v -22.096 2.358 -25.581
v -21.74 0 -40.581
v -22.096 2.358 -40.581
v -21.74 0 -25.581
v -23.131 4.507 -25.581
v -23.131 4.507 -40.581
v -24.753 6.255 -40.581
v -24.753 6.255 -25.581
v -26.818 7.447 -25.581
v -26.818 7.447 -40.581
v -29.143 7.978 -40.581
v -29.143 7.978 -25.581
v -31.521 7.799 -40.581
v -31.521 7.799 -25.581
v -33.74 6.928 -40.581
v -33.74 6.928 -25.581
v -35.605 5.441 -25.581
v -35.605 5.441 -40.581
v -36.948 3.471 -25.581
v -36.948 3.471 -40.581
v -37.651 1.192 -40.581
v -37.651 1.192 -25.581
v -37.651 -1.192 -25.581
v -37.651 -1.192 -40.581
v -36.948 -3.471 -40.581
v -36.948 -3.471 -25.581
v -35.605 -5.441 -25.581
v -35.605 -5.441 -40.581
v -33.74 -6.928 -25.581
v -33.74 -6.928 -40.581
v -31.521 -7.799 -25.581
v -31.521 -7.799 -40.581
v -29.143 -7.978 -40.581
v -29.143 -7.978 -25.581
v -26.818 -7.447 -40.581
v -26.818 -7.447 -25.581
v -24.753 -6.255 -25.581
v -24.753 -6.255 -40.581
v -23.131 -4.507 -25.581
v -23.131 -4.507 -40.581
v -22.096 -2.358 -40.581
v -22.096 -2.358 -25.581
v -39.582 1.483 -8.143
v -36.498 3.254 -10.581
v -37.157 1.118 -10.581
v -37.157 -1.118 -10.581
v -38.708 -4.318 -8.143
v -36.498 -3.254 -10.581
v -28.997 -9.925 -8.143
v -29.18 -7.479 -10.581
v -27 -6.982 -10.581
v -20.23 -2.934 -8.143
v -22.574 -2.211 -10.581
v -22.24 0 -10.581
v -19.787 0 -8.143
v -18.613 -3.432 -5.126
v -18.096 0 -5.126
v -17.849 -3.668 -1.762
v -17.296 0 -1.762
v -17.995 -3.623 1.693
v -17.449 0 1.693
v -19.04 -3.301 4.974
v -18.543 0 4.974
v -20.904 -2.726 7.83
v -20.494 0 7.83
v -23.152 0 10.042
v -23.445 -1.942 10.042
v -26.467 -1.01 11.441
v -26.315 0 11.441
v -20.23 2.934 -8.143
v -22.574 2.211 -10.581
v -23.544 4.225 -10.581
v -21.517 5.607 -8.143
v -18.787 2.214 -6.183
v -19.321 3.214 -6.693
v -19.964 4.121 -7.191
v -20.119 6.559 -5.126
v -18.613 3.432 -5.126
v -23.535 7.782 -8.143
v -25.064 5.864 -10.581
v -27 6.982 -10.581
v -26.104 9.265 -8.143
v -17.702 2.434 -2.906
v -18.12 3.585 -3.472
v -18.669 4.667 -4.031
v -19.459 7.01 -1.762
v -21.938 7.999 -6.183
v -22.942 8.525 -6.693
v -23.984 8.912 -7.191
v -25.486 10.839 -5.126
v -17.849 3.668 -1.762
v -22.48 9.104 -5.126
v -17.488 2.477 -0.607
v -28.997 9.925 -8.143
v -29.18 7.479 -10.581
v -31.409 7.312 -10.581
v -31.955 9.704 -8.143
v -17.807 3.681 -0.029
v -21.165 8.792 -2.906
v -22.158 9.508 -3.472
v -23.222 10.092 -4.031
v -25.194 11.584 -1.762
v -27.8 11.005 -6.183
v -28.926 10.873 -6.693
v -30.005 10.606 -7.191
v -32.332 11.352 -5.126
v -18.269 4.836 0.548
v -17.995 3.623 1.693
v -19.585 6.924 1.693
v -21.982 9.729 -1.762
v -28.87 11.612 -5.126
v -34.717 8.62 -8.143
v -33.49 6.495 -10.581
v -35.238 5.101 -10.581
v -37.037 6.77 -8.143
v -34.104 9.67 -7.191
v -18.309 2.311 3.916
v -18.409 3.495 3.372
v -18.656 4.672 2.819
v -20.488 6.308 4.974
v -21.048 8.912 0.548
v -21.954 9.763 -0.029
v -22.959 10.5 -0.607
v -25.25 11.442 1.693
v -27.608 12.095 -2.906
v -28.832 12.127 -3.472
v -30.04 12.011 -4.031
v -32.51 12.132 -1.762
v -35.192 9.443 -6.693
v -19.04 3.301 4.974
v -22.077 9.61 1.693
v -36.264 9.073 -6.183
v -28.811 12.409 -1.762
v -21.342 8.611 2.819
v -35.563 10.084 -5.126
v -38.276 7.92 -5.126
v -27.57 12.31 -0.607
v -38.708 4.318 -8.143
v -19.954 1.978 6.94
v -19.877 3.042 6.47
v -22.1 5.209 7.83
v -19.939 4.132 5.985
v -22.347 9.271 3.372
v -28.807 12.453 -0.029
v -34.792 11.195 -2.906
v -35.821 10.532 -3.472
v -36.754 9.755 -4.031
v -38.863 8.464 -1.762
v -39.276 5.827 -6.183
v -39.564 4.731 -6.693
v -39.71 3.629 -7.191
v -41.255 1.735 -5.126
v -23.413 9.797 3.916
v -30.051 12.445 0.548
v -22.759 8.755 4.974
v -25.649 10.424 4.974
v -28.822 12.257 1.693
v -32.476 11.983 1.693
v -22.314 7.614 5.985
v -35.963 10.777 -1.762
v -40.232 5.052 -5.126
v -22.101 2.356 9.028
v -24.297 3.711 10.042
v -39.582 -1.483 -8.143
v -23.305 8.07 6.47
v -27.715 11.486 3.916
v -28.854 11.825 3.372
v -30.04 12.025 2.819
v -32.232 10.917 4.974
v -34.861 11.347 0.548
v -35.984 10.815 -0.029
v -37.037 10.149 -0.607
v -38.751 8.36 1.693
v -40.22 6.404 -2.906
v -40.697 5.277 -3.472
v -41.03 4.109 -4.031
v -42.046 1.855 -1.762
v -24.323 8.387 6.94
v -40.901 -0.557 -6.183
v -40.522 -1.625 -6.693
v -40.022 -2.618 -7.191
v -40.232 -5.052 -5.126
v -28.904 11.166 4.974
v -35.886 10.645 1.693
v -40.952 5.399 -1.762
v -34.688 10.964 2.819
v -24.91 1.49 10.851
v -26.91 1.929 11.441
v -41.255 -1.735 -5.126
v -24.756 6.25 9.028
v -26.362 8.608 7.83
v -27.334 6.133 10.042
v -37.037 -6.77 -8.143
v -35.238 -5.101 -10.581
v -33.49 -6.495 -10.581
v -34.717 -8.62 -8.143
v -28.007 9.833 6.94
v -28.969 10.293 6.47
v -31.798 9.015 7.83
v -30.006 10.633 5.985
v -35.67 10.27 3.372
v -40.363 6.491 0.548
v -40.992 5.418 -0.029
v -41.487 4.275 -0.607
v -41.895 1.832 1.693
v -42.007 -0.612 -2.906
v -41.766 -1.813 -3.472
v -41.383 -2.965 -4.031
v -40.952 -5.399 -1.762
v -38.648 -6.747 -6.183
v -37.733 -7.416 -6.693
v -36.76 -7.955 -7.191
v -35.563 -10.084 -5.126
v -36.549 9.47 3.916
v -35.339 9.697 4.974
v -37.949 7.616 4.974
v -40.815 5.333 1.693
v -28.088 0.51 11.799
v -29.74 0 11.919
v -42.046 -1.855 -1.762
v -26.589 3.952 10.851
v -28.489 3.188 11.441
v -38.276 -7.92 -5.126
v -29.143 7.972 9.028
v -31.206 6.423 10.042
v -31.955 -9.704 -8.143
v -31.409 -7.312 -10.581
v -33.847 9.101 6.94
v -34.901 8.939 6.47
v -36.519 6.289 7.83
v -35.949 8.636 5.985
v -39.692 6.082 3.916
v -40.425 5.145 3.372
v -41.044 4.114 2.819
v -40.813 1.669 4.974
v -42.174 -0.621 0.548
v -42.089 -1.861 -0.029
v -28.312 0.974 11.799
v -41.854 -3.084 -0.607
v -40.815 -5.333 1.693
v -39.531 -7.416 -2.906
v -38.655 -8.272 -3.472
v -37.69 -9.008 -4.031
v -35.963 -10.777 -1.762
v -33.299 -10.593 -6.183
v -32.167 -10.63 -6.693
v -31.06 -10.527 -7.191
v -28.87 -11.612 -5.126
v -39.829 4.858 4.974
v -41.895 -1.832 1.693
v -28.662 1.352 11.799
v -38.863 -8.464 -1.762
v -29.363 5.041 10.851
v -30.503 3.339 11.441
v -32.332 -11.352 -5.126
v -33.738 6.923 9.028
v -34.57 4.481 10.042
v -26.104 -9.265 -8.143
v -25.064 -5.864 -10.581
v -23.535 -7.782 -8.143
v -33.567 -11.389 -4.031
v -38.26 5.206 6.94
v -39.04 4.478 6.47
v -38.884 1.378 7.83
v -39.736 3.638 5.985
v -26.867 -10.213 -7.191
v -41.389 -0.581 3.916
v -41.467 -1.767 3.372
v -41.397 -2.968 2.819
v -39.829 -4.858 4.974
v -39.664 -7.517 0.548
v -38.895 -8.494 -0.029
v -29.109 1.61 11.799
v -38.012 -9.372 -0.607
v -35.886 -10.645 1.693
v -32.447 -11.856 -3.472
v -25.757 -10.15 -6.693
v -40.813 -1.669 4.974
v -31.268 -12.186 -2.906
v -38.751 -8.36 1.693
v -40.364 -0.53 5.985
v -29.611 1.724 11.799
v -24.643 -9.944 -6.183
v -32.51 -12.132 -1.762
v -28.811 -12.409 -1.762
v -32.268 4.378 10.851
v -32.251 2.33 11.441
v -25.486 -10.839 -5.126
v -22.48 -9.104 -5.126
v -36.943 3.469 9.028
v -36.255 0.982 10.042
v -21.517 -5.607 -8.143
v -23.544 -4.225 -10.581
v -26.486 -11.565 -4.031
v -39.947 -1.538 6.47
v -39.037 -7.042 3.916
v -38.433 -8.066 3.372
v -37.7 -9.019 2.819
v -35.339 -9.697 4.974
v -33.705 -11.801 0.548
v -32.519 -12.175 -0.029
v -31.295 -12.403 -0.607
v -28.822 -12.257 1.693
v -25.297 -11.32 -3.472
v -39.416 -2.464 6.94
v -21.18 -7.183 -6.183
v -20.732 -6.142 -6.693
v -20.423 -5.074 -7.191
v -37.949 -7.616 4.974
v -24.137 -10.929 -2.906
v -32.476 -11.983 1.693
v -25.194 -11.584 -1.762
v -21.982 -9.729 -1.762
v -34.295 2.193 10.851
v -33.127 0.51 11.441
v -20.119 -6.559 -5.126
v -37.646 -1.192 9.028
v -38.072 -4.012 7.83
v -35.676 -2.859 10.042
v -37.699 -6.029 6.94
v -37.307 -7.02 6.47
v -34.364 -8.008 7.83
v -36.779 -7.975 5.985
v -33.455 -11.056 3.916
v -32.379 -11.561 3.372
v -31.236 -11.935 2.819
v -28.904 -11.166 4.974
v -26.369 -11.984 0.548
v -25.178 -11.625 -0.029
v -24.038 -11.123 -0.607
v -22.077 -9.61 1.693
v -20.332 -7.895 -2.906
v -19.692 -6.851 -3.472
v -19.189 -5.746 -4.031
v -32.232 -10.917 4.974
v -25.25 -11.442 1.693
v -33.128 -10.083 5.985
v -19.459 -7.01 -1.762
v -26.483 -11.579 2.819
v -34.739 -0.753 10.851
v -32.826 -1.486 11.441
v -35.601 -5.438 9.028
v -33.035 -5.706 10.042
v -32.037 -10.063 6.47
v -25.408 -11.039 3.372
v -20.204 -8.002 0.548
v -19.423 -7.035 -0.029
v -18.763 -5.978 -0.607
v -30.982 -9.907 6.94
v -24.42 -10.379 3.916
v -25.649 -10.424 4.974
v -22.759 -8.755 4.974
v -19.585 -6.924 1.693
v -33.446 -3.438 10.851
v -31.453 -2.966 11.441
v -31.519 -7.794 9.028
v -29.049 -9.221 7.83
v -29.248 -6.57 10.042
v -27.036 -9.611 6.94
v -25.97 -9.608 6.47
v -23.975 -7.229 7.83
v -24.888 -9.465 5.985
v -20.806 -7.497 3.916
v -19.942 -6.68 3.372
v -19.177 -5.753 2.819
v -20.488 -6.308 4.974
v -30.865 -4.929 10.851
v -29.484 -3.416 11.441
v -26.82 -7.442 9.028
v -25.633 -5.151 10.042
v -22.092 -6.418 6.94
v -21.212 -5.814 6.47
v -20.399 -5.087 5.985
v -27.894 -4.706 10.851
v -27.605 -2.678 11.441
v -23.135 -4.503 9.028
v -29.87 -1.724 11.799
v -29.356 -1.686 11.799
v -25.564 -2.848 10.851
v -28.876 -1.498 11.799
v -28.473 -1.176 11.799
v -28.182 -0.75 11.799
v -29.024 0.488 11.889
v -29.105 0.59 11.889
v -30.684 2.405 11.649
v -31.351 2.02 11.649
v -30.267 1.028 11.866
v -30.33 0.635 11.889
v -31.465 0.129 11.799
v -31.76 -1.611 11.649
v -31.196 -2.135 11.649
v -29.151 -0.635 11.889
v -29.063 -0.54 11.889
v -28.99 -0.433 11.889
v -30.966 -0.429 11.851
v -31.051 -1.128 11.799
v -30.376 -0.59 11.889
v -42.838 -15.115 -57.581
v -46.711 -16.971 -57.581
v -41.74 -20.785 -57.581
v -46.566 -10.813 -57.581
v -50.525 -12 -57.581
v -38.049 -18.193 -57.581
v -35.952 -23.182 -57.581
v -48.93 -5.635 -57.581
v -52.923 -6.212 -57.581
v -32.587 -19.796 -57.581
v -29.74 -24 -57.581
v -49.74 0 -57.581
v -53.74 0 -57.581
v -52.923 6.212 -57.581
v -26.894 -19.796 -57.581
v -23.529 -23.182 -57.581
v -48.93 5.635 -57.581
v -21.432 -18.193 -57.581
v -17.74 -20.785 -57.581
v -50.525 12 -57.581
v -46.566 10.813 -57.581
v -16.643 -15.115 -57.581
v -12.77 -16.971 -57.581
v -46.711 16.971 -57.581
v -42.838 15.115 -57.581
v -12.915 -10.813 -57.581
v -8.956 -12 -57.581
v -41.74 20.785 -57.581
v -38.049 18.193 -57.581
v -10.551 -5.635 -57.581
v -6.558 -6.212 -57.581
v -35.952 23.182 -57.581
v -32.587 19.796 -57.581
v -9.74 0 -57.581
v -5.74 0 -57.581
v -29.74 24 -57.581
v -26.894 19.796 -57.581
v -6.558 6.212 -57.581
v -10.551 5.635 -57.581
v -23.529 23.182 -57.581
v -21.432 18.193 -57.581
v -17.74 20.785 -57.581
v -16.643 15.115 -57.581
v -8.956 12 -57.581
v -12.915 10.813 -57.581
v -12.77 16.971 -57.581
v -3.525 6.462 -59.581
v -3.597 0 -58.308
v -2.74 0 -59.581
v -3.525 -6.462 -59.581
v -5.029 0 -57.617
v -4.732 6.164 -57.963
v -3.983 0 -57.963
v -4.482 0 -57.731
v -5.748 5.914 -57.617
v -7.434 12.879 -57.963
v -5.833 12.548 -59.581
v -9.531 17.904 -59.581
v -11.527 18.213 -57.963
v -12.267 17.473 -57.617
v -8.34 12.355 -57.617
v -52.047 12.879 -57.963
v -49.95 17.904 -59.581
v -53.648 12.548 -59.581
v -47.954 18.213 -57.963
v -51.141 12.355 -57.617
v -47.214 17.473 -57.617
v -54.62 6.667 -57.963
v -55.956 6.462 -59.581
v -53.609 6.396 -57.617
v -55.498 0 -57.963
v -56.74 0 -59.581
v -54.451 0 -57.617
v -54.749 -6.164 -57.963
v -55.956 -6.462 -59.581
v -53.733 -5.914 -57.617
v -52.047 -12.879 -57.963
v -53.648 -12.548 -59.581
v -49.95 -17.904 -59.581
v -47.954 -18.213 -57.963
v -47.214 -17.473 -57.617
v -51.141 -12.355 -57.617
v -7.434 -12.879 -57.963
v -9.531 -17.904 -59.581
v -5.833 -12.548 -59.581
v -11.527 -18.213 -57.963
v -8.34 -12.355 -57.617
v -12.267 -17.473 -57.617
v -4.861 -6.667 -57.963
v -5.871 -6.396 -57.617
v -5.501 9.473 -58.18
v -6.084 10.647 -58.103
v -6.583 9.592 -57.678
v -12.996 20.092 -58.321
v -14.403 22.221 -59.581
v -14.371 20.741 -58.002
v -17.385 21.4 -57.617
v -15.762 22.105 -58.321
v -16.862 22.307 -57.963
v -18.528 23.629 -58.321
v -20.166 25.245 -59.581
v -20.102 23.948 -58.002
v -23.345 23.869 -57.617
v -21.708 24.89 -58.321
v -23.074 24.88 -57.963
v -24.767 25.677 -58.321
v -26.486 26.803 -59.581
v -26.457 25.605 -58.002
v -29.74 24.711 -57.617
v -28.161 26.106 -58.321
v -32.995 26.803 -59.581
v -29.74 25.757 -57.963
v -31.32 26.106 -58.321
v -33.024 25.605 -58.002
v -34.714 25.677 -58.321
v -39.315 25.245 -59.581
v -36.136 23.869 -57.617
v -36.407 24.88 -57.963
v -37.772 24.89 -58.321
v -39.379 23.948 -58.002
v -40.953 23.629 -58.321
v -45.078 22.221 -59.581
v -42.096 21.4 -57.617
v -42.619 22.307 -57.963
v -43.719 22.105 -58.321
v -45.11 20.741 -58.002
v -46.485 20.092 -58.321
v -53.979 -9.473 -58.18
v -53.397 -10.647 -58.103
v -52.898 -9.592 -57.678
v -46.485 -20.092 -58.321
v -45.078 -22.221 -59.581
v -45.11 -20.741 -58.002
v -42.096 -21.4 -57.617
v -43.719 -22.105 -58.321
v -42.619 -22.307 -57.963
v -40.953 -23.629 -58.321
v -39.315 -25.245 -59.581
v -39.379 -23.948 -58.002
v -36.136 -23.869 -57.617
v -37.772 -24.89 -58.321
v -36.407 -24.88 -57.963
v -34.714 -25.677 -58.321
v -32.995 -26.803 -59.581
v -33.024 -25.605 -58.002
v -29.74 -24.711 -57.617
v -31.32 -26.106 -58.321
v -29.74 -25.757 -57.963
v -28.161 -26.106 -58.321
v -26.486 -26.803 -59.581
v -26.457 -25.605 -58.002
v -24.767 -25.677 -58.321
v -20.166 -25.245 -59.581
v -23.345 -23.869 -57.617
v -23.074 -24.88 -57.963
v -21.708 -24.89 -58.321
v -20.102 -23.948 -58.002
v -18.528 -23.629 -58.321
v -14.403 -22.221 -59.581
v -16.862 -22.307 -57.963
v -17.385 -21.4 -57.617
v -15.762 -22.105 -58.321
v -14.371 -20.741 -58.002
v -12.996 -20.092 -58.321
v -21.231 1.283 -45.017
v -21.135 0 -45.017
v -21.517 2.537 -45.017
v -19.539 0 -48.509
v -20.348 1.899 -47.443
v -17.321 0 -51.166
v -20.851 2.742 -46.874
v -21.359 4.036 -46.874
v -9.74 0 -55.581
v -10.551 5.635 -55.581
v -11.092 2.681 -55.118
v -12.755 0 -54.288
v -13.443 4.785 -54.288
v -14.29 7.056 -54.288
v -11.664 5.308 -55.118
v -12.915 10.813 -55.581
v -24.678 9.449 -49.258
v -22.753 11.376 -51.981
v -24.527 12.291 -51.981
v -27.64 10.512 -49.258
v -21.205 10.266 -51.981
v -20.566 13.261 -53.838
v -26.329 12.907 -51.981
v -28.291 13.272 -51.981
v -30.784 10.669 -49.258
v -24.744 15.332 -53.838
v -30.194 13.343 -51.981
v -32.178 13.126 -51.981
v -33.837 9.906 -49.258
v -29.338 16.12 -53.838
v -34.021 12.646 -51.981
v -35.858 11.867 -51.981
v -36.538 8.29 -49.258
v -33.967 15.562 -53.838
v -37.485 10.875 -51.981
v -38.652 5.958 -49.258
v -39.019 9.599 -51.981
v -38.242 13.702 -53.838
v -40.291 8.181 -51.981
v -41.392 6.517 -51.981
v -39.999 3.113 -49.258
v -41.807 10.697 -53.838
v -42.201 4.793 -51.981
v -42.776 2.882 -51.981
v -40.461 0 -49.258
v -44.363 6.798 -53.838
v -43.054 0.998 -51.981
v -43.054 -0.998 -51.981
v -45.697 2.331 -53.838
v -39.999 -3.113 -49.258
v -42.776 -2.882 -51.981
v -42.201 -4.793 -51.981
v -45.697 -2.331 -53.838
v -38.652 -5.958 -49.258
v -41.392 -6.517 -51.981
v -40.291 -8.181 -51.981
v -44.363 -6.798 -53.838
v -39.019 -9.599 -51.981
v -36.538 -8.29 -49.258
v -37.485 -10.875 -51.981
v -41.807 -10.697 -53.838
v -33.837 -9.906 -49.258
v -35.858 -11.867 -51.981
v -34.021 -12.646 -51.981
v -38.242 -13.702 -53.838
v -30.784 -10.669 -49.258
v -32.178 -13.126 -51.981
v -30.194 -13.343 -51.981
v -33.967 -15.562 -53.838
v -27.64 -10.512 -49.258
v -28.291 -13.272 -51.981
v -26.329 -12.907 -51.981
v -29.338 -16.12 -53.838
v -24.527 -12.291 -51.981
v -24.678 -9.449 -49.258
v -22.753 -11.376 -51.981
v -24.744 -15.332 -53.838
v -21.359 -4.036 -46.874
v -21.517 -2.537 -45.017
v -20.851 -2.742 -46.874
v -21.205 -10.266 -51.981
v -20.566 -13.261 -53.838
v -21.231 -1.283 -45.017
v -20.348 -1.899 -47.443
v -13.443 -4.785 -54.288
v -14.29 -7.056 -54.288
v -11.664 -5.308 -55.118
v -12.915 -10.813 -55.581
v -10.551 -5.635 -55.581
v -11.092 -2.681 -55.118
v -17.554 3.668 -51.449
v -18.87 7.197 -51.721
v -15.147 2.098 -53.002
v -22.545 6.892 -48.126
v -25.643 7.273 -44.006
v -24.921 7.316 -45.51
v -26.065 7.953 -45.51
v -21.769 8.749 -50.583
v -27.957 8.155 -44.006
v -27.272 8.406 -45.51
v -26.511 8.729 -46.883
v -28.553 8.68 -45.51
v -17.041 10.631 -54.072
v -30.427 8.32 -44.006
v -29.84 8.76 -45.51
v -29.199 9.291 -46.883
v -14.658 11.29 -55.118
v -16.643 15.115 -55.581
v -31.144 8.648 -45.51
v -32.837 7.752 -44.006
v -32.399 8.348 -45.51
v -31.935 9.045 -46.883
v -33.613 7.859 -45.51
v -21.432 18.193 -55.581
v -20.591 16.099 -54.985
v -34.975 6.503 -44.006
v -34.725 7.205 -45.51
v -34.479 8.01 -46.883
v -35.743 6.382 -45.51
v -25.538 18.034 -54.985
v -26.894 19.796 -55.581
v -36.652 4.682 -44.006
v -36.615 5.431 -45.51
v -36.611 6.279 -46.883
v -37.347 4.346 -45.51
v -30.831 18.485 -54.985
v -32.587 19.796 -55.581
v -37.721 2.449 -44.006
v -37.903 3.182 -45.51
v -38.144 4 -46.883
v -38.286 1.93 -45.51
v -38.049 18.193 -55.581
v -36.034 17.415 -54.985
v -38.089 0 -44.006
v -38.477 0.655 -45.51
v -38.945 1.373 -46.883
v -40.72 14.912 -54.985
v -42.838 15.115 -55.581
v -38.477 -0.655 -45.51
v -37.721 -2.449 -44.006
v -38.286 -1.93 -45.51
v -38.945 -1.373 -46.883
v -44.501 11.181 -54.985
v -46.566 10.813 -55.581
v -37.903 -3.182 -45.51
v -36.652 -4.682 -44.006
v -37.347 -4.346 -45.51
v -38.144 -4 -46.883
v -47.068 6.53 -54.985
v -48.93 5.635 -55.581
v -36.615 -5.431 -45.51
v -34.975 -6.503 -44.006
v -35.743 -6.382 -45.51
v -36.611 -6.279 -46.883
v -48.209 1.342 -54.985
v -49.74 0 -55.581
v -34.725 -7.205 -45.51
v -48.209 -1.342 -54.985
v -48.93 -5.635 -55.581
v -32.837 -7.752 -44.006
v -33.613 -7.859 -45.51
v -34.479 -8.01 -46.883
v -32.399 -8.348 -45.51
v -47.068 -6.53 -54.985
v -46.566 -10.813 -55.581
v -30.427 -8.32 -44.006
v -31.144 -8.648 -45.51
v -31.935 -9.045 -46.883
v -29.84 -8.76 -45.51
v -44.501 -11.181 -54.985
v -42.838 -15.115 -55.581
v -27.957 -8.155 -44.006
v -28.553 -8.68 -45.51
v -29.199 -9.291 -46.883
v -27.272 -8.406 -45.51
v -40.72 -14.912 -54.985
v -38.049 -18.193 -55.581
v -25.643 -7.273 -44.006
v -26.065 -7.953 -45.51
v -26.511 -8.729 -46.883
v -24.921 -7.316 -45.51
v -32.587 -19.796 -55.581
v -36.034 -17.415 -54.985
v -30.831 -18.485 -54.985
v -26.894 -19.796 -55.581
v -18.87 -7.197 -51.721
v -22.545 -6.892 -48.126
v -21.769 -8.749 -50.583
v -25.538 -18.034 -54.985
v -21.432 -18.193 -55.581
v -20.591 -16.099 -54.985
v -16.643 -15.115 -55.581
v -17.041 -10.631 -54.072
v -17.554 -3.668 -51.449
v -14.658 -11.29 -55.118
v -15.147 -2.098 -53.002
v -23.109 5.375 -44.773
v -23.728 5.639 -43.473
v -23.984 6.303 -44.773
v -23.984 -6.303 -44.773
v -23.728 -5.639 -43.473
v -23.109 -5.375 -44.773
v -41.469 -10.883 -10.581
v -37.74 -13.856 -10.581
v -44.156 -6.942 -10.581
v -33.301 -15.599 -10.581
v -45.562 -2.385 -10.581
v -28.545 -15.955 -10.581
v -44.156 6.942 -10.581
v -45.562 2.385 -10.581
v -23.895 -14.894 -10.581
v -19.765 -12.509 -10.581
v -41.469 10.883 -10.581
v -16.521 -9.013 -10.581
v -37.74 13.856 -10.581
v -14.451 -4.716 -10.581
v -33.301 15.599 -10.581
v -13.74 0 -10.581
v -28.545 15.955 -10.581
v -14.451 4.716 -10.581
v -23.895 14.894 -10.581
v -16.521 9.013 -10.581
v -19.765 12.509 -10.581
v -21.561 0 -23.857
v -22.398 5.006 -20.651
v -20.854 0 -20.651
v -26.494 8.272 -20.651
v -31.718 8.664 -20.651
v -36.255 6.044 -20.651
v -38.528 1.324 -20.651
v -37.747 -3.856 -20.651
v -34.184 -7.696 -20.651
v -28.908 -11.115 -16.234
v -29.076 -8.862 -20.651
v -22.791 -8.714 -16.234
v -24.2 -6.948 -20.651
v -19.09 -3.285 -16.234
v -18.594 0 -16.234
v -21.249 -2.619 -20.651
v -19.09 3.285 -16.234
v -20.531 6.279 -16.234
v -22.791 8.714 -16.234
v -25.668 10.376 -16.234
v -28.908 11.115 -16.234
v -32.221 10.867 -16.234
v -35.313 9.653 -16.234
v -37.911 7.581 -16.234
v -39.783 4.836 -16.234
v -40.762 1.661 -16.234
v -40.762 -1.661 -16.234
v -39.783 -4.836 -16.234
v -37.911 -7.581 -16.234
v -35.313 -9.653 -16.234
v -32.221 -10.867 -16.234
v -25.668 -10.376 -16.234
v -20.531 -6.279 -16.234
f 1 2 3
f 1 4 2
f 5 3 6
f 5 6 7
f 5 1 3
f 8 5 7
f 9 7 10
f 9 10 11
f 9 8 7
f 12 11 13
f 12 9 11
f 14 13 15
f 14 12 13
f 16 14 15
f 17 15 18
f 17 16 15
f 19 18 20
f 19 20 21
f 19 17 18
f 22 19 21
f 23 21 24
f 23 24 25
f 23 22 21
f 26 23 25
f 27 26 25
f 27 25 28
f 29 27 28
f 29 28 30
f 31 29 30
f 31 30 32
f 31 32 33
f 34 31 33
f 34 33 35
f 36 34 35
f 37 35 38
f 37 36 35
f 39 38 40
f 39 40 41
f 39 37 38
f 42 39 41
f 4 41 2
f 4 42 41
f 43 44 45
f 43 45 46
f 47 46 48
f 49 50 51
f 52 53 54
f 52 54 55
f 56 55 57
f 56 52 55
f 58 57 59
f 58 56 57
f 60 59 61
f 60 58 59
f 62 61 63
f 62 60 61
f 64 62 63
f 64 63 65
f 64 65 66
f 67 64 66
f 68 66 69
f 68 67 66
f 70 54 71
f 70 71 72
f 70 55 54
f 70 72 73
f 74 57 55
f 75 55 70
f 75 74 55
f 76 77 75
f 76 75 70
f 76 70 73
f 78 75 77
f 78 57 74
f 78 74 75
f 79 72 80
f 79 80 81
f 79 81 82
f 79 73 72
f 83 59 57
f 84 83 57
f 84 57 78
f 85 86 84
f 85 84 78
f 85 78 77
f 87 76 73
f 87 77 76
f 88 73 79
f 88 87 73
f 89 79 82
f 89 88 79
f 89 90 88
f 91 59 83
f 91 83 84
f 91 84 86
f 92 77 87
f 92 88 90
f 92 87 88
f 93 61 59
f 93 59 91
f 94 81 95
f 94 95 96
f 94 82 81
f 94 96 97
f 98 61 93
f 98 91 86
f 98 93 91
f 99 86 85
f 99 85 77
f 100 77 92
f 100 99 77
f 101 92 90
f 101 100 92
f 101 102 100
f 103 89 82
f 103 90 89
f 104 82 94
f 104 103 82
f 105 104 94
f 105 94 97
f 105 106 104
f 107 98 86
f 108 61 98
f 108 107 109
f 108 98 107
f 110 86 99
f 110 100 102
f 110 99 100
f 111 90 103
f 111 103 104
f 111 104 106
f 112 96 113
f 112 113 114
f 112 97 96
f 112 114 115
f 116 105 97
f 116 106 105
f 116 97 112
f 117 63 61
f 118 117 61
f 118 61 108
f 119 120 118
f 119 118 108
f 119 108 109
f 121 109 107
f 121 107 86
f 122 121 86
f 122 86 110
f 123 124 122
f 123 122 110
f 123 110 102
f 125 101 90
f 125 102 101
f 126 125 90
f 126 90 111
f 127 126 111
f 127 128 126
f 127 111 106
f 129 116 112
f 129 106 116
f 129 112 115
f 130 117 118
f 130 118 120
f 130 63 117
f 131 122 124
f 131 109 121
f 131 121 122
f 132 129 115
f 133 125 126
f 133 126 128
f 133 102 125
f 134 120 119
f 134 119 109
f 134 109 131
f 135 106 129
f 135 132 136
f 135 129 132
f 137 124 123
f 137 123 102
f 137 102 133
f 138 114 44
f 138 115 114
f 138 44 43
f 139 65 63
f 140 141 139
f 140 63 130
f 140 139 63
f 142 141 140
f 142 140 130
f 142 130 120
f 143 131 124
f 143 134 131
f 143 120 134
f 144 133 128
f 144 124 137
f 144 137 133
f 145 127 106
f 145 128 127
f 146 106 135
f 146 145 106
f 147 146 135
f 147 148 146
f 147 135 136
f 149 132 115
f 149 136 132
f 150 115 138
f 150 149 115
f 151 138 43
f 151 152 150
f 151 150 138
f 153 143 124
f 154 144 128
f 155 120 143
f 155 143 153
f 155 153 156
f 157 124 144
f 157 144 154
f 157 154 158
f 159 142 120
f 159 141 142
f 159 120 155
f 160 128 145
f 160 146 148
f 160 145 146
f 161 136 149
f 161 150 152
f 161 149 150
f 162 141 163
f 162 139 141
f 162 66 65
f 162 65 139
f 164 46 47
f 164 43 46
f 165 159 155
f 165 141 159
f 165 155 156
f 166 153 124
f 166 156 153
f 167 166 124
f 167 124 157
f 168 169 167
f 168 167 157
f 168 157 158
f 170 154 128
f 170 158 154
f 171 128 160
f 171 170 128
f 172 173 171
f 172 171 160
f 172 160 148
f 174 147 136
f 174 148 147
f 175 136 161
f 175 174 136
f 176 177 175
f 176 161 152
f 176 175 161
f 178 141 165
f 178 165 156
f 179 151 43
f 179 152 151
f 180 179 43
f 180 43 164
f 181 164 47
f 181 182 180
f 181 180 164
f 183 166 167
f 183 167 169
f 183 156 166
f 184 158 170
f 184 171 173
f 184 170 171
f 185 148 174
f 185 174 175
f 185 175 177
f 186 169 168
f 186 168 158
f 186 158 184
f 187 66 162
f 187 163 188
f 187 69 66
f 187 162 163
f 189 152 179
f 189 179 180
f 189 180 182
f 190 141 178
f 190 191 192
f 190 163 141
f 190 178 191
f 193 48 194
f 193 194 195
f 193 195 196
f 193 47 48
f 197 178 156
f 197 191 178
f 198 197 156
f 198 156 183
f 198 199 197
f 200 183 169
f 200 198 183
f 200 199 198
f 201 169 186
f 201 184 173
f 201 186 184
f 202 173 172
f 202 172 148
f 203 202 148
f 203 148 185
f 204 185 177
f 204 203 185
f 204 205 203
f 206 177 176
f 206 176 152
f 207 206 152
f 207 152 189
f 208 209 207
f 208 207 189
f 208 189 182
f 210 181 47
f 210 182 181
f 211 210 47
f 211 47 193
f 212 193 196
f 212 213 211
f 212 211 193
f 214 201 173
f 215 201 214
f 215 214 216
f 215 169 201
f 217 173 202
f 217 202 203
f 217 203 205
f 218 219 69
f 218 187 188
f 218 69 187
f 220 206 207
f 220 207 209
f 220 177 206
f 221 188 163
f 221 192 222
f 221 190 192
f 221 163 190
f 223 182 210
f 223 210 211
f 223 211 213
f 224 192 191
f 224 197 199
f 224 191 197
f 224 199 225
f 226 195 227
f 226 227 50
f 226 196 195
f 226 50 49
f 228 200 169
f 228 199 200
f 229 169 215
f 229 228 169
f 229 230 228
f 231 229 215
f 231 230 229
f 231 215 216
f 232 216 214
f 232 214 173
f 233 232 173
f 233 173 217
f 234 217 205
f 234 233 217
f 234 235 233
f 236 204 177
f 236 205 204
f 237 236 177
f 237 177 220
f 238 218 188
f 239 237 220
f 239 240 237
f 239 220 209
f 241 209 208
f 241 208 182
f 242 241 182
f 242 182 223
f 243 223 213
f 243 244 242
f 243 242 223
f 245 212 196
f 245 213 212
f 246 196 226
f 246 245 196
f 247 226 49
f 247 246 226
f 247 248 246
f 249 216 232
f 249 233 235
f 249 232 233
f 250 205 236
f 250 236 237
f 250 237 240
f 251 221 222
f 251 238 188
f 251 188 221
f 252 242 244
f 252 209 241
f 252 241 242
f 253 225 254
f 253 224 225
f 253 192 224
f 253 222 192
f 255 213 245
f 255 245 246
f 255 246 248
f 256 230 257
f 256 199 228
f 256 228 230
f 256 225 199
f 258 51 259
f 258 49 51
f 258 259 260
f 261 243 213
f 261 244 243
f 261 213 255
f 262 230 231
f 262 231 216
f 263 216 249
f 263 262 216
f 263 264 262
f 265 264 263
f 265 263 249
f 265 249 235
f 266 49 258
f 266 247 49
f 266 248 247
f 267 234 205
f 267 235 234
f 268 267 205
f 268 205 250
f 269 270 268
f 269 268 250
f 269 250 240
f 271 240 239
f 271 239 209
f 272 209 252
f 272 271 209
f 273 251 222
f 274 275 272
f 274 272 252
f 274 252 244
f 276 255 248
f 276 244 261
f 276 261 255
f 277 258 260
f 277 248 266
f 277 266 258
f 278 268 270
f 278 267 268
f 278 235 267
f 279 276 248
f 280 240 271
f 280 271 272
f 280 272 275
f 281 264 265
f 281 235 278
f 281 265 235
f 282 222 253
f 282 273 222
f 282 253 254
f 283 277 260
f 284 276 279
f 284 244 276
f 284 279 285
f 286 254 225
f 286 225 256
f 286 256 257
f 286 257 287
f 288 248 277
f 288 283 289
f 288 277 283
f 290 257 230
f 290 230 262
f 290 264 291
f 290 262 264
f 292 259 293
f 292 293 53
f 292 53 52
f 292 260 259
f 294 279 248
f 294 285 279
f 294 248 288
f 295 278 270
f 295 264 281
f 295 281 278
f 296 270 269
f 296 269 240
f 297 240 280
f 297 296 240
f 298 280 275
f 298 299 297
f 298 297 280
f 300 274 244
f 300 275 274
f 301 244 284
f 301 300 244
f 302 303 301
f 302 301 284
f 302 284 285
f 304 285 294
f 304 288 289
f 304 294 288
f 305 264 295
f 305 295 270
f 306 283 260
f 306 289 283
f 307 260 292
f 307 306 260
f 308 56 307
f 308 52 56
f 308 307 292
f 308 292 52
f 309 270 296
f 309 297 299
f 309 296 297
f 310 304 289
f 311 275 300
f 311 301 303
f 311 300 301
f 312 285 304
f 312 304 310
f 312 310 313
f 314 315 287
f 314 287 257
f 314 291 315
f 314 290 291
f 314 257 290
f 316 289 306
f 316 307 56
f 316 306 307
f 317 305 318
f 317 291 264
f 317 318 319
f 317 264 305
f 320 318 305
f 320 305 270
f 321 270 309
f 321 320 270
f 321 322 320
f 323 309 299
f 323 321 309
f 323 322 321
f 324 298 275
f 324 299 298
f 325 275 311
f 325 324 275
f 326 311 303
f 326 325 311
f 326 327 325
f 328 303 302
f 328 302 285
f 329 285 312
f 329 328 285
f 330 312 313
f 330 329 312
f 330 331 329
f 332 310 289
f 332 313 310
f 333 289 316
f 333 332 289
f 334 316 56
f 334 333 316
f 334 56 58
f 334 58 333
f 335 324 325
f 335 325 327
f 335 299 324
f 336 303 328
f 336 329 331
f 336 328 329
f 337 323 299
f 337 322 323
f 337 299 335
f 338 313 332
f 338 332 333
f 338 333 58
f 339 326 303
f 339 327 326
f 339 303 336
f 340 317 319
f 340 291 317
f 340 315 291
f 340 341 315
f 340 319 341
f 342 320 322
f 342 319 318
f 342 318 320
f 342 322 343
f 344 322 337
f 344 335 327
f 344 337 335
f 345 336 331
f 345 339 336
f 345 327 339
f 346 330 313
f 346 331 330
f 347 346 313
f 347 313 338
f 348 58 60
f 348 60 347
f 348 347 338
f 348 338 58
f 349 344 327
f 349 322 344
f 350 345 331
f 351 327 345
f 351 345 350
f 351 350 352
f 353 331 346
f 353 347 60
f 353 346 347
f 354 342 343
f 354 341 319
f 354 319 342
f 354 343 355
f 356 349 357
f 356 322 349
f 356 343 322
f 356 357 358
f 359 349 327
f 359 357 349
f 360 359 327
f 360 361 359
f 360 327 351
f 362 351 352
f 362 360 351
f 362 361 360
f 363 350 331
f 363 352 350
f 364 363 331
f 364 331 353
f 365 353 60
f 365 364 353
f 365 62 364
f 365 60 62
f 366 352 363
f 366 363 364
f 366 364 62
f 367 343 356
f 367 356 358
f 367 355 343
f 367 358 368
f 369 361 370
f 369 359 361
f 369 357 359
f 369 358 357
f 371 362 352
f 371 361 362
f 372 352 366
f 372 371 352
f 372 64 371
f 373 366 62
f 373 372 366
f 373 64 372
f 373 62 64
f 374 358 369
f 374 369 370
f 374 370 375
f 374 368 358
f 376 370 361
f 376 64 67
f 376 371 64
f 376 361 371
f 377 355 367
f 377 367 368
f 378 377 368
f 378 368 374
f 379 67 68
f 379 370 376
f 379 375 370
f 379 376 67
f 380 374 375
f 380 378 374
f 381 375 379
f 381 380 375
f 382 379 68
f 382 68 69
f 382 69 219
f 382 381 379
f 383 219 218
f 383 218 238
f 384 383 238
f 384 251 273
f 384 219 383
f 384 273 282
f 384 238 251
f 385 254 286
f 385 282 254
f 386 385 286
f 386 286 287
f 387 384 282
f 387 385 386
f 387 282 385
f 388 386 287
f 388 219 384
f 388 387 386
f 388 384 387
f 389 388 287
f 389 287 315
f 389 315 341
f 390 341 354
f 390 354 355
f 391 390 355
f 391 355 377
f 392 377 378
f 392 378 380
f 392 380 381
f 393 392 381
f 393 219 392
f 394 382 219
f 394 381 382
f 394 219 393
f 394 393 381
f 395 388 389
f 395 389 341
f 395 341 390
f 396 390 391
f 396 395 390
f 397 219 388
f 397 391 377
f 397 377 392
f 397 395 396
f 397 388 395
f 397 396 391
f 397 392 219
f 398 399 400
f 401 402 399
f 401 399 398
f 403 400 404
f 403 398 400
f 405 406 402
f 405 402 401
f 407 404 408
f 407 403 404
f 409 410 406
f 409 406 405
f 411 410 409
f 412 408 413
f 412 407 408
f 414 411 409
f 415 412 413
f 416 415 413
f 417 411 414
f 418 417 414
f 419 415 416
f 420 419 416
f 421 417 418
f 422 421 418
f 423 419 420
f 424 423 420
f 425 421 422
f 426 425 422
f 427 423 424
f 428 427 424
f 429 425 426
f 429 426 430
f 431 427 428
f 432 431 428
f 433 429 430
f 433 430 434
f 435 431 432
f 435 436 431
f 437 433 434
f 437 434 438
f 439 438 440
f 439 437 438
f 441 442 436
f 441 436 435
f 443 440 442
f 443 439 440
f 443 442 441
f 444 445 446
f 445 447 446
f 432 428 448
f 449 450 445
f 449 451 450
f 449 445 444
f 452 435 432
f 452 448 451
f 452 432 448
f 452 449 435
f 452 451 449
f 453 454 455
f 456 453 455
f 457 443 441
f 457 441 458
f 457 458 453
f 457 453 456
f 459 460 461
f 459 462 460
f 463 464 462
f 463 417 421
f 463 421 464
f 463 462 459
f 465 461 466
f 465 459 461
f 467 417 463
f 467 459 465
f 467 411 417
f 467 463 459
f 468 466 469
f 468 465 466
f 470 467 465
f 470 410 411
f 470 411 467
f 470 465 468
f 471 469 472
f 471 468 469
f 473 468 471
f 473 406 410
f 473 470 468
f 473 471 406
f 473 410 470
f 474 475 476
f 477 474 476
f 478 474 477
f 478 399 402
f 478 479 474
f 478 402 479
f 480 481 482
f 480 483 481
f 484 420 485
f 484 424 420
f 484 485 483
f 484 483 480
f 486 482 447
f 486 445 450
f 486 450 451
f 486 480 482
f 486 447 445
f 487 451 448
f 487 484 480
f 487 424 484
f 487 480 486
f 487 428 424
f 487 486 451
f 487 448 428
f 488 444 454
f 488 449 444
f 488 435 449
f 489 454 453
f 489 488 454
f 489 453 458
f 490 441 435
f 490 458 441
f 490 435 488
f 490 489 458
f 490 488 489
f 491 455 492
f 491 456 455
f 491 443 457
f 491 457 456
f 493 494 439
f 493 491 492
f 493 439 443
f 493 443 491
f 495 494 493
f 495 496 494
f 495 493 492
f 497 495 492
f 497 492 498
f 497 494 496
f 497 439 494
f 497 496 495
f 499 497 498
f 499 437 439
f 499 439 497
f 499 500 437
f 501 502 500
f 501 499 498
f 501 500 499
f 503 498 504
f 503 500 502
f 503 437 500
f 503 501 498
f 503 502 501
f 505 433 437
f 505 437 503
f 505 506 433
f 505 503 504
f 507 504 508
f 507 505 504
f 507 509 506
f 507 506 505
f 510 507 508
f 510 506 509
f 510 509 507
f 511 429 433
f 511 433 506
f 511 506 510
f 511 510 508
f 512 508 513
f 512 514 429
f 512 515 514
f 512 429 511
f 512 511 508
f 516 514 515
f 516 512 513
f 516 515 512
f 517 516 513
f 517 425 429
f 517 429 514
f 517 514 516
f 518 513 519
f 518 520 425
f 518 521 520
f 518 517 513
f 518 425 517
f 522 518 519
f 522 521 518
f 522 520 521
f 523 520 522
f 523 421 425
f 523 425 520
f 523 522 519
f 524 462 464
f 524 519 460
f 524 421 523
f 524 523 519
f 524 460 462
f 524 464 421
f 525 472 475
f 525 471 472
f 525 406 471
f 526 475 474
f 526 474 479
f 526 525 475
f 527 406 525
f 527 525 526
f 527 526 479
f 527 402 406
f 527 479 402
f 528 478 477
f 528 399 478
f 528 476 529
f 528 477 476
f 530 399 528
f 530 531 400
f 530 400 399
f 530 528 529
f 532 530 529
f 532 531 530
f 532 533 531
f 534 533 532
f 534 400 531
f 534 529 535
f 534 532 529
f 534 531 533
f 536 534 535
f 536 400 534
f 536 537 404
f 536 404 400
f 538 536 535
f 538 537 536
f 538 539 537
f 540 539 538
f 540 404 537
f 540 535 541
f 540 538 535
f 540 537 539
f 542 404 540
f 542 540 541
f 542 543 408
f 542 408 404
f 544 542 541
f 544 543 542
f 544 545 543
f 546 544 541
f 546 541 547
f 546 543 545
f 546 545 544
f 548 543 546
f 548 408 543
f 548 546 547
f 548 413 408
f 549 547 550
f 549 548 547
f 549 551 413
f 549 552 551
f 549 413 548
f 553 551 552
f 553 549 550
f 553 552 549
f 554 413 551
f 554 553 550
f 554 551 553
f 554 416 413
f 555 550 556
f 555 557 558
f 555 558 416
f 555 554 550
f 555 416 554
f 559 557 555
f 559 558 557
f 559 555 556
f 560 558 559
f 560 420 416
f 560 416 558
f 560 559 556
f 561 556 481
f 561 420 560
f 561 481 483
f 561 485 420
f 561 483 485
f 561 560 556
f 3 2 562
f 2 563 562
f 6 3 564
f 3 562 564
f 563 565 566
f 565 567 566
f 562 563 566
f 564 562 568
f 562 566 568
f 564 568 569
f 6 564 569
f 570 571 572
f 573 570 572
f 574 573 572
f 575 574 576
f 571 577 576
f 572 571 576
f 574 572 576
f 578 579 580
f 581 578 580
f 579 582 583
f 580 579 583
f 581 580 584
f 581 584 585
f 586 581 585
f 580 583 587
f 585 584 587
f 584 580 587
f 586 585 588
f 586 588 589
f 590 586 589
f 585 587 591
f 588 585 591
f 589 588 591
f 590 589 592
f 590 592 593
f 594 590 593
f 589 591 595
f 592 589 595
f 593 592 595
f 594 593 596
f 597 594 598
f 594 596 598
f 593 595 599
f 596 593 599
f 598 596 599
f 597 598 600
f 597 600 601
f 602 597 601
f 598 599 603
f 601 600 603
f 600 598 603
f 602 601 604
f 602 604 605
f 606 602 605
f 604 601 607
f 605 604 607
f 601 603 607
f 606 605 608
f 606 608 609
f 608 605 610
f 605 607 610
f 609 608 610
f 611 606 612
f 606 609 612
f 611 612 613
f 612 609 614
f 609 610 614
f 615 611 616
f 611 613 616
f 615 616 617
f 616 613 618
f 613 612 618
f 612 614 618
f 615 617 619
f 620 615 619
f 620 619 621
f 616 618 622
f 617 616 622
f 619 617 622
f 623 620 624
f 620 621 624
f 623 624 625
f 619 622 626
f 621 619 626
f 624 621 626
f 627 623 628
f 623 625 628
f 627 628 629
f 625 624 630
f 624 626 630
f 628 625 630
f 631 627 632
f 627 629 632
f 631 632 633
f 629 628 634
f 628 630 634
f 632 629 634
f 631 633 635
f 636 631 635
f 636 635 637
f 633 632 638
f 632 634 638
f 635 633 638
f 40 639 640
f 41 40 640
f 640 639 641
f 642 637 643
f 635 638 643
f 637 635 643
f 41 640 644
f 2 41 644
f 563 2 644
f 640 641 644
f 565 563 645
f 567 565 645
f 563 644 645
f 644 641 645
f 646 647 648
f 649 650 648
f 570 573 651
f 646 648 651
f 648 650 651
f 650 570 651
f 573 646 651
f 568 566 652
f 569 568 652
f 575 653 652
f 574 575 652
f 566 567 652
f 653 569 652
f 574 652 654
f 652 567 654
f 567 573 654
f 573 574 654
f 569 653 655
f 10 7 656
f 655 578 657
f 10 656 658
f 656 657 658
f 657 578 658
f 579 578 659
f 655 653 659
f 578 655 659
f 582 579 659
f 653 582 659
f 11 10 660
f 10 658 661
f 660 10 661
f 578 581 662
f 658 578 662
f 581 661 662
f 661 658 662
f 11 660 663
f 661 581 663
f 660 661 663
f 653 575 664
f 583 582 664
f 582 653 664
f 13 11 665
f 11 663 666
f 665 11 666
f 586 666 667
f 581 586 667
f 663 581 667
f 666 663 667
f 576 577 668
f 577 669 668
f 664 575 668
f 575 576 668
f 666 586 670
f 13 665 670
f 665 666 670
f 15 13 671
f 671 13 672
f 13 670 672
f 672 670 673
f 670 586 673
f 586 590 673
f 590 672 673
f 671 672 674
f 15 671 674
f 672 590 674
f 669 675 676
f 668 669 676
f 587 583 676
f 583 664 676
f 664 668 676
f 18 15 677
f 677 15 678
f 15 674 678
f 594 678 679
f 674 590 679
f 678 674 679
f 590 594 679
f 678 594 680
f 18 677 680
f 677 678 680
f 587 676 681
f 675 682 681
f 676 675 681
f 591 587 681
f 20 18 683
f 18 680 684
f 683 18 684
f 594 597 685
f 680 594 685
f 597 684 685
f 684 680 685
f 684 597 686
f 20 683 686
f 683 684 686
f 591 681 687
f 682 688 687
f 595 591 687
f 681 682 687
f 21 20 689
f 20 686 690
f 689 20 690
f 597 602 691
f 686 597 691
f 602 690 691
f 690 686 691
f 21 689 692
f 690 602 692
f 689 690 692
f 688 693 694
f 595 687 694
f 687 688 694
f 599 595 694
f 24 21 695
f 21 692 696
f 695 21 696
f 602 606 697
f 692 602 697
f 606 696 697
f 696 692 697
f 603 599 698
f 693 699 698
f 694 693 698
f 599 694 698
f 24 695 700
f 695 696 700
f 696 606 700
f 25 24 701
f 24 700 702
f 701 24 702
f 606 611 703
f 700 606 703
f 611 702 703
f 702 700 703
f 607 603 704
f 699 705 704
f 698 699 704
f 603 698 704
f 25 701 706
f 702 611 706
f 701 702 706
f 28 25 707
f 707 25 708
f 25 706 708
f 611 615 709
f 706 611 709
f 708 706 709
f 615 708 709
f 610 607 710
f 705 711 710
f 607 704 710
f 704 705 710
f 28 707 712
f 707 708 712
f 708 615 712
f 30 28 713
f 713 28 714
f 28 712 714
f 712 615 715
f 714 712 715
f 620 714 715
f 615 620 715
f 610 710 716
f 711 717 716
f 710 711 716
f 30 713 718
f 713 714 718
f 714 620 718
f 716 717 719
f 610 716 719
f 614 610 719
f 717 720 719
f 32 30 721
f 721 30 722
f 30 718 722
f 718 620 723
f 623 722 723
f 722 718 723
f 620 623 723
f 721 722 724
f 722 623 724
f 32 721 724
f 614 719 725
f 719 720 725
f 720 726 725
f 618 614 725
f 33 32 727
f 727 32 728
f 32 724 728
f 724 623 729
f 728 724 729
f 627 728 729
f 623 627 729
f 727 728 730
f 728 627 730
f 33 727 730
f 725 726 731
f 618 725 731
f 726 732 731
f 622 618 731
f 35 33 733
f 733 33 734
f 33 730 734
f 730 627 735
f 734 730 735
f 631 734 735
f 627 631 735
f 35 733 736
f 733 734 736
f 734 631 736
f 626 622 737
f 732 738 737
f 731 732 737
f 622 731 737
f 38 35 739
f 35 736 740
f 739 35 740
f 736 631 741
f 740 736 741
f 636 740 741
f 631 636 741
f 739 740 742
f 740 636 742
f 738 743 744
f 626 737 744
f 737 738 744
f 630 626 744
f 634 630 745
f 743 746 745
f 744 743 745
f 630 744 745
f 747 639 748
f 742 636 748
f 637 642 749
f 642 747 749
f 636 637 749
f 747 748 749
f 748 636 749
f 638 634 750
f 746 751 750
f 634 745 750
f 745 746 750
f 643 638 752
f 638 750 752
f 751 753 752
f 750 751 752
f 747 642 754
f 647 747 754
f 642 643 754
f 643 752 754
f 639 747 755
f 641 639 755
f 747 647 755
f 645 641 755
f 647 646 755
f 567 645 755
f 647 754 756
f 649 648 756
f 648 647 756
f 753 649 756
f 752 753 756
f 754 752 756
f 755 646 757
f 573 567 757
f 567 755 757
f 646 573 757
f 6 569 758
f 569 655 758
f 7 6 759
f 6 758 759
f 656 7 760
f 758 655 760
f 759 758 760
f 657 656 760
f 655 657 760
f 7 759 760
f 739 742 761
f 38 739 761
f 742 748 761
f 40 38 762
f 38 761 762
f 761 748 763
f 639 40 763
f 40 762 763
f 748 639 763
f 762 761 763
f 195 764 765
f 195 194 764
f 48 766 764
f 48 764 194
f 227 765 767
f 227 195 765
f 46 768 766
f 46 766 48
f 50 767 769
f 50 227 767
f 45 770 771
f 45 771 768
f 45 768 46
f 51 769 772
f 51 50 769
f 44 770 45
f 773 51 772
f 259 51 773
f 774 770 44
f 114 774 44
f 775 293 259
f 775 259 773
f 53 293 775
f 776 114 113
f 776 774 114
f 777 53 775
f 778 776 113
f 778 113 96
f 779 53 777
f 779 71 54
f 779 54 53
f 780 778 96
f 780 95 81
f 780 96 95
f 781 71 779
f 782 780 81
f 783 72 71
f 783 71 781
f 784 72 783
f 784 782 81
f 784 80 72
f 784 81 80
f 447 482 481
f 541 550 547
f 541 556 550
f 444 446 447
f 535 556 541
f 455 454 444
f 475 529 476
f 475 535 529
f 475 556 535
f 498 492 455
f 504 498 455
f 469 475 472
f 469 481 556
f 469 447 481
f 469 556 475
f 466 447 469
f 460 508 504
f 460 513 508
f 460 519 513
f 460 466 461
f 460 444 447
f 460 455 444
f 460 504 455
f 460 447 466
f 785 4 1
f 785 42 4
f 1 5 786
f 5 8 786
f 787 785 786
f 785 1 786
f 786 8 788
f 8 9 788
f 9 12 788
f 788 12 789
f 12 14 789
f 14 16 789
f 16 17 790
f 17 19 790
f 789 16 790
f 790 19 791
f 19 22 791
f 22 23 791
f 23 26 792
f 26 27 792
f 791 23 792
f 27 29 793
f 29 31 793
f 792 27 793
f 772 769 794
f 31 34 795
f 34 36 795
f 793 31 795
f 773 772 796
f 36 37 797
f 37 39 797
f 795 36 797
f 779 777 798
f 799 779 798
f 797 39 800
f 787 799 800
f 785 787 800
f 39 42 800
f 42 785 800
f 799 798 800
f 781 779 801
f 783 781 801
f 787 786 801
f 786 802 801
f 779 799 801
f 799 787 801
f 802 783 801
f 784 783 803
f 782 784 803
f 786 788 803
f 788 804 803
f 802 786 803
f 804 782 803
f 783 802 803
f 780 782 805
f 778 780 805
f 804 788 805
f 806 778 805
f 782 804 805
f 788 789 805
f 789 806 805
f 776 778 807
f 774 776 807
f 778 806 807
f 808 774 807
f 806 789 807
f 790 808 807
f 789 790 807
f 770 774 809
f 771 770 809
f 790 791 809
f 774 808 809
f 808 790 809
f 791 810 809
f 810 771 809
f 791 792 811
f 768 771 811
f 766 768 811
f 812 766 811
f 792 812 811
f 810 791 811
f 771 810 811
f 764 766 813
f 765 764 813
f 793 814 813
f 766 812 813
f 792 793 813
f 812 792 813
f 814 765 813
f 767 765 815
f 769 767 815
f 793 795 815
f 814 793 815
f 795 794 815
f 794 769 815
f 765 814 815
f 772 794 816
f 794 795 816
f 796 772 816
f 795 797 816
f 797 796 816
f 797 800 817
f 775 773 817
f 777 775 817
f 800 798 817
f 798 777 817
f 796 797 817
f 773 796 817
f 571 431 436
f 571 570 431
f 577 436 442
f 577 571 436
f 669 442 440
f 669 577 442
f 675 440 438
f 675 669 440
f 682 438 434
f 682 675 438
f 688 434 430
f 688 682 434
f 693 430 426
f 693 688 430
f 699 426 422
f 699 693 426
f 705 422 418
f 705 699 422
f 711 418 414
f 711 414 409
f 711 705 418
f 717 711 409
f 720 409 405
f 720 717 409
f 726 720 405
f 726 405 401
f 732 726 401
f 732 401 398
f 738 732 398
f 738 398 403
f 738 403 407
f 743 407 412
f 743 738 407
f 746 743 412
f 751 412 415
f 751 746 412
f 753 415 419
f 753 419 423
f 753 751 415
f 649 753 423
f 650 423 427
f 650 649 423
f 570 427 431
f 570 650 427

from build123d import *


with BuildPart() as f1:
    # F0 (on Front) → F1 (revolve)
    with BuildSketch(Plane.XZ):
        with BuildLine():
            Line((-13.740452, -10.580902), (-22.240452, -10.580902))
            ThreePointArc((-22.240452, -10.580902), (-17.881911, 3.371945), (-29.740452, 11.919098))
            Line((-29.740452, 11.919098), (-29.740452, -59.580902))
            Line((-29.740452, -59.580902), (-2.740452, -59.580902))
            add(Edge.make_bspline(
                [(-2.740452, -59.580902), (-3.541401, -58.527526), (-3.541401, -57.564959), (-5.740452, -57.580902)],
                knots=[0, 0, 0, 0, 3.605551, 3.605551, 3.605551, 3.605551], degree=3))
            Line((-5.740452, -57.580902), (-9.740452, -57.580902))
            Line((-9.740452, -57.580902), (-9.740452, -55.580902))
            add(Edge.make_bspline(
                [(-21.740452, -40.580902), (-21.768171, -51.726915), (-11.44431, -54.835711), (-9.740452, -55.580902)],
                knots=[0, 0, 0, 0, 19.209373, 19.209373, 19.209373, 19.209373], degree=3))
            Line((-21.740452, -40.580902), (-21.740452, -25.580902))
            add(Edge.make_bspline(
                [(-13.740452, -10.580902), (-22.564874, -19.068293), (-21.347321, -24.326921), (-21.740452, -25.580902)],
                knots=[0, 0, 0, 0, 17, 17, 17, 17], degree=3))
        make_face()
    revolve(axis=Axis((-29.740452, 0, -23.830902), (0, 0, 1)))


solid = f1.part
